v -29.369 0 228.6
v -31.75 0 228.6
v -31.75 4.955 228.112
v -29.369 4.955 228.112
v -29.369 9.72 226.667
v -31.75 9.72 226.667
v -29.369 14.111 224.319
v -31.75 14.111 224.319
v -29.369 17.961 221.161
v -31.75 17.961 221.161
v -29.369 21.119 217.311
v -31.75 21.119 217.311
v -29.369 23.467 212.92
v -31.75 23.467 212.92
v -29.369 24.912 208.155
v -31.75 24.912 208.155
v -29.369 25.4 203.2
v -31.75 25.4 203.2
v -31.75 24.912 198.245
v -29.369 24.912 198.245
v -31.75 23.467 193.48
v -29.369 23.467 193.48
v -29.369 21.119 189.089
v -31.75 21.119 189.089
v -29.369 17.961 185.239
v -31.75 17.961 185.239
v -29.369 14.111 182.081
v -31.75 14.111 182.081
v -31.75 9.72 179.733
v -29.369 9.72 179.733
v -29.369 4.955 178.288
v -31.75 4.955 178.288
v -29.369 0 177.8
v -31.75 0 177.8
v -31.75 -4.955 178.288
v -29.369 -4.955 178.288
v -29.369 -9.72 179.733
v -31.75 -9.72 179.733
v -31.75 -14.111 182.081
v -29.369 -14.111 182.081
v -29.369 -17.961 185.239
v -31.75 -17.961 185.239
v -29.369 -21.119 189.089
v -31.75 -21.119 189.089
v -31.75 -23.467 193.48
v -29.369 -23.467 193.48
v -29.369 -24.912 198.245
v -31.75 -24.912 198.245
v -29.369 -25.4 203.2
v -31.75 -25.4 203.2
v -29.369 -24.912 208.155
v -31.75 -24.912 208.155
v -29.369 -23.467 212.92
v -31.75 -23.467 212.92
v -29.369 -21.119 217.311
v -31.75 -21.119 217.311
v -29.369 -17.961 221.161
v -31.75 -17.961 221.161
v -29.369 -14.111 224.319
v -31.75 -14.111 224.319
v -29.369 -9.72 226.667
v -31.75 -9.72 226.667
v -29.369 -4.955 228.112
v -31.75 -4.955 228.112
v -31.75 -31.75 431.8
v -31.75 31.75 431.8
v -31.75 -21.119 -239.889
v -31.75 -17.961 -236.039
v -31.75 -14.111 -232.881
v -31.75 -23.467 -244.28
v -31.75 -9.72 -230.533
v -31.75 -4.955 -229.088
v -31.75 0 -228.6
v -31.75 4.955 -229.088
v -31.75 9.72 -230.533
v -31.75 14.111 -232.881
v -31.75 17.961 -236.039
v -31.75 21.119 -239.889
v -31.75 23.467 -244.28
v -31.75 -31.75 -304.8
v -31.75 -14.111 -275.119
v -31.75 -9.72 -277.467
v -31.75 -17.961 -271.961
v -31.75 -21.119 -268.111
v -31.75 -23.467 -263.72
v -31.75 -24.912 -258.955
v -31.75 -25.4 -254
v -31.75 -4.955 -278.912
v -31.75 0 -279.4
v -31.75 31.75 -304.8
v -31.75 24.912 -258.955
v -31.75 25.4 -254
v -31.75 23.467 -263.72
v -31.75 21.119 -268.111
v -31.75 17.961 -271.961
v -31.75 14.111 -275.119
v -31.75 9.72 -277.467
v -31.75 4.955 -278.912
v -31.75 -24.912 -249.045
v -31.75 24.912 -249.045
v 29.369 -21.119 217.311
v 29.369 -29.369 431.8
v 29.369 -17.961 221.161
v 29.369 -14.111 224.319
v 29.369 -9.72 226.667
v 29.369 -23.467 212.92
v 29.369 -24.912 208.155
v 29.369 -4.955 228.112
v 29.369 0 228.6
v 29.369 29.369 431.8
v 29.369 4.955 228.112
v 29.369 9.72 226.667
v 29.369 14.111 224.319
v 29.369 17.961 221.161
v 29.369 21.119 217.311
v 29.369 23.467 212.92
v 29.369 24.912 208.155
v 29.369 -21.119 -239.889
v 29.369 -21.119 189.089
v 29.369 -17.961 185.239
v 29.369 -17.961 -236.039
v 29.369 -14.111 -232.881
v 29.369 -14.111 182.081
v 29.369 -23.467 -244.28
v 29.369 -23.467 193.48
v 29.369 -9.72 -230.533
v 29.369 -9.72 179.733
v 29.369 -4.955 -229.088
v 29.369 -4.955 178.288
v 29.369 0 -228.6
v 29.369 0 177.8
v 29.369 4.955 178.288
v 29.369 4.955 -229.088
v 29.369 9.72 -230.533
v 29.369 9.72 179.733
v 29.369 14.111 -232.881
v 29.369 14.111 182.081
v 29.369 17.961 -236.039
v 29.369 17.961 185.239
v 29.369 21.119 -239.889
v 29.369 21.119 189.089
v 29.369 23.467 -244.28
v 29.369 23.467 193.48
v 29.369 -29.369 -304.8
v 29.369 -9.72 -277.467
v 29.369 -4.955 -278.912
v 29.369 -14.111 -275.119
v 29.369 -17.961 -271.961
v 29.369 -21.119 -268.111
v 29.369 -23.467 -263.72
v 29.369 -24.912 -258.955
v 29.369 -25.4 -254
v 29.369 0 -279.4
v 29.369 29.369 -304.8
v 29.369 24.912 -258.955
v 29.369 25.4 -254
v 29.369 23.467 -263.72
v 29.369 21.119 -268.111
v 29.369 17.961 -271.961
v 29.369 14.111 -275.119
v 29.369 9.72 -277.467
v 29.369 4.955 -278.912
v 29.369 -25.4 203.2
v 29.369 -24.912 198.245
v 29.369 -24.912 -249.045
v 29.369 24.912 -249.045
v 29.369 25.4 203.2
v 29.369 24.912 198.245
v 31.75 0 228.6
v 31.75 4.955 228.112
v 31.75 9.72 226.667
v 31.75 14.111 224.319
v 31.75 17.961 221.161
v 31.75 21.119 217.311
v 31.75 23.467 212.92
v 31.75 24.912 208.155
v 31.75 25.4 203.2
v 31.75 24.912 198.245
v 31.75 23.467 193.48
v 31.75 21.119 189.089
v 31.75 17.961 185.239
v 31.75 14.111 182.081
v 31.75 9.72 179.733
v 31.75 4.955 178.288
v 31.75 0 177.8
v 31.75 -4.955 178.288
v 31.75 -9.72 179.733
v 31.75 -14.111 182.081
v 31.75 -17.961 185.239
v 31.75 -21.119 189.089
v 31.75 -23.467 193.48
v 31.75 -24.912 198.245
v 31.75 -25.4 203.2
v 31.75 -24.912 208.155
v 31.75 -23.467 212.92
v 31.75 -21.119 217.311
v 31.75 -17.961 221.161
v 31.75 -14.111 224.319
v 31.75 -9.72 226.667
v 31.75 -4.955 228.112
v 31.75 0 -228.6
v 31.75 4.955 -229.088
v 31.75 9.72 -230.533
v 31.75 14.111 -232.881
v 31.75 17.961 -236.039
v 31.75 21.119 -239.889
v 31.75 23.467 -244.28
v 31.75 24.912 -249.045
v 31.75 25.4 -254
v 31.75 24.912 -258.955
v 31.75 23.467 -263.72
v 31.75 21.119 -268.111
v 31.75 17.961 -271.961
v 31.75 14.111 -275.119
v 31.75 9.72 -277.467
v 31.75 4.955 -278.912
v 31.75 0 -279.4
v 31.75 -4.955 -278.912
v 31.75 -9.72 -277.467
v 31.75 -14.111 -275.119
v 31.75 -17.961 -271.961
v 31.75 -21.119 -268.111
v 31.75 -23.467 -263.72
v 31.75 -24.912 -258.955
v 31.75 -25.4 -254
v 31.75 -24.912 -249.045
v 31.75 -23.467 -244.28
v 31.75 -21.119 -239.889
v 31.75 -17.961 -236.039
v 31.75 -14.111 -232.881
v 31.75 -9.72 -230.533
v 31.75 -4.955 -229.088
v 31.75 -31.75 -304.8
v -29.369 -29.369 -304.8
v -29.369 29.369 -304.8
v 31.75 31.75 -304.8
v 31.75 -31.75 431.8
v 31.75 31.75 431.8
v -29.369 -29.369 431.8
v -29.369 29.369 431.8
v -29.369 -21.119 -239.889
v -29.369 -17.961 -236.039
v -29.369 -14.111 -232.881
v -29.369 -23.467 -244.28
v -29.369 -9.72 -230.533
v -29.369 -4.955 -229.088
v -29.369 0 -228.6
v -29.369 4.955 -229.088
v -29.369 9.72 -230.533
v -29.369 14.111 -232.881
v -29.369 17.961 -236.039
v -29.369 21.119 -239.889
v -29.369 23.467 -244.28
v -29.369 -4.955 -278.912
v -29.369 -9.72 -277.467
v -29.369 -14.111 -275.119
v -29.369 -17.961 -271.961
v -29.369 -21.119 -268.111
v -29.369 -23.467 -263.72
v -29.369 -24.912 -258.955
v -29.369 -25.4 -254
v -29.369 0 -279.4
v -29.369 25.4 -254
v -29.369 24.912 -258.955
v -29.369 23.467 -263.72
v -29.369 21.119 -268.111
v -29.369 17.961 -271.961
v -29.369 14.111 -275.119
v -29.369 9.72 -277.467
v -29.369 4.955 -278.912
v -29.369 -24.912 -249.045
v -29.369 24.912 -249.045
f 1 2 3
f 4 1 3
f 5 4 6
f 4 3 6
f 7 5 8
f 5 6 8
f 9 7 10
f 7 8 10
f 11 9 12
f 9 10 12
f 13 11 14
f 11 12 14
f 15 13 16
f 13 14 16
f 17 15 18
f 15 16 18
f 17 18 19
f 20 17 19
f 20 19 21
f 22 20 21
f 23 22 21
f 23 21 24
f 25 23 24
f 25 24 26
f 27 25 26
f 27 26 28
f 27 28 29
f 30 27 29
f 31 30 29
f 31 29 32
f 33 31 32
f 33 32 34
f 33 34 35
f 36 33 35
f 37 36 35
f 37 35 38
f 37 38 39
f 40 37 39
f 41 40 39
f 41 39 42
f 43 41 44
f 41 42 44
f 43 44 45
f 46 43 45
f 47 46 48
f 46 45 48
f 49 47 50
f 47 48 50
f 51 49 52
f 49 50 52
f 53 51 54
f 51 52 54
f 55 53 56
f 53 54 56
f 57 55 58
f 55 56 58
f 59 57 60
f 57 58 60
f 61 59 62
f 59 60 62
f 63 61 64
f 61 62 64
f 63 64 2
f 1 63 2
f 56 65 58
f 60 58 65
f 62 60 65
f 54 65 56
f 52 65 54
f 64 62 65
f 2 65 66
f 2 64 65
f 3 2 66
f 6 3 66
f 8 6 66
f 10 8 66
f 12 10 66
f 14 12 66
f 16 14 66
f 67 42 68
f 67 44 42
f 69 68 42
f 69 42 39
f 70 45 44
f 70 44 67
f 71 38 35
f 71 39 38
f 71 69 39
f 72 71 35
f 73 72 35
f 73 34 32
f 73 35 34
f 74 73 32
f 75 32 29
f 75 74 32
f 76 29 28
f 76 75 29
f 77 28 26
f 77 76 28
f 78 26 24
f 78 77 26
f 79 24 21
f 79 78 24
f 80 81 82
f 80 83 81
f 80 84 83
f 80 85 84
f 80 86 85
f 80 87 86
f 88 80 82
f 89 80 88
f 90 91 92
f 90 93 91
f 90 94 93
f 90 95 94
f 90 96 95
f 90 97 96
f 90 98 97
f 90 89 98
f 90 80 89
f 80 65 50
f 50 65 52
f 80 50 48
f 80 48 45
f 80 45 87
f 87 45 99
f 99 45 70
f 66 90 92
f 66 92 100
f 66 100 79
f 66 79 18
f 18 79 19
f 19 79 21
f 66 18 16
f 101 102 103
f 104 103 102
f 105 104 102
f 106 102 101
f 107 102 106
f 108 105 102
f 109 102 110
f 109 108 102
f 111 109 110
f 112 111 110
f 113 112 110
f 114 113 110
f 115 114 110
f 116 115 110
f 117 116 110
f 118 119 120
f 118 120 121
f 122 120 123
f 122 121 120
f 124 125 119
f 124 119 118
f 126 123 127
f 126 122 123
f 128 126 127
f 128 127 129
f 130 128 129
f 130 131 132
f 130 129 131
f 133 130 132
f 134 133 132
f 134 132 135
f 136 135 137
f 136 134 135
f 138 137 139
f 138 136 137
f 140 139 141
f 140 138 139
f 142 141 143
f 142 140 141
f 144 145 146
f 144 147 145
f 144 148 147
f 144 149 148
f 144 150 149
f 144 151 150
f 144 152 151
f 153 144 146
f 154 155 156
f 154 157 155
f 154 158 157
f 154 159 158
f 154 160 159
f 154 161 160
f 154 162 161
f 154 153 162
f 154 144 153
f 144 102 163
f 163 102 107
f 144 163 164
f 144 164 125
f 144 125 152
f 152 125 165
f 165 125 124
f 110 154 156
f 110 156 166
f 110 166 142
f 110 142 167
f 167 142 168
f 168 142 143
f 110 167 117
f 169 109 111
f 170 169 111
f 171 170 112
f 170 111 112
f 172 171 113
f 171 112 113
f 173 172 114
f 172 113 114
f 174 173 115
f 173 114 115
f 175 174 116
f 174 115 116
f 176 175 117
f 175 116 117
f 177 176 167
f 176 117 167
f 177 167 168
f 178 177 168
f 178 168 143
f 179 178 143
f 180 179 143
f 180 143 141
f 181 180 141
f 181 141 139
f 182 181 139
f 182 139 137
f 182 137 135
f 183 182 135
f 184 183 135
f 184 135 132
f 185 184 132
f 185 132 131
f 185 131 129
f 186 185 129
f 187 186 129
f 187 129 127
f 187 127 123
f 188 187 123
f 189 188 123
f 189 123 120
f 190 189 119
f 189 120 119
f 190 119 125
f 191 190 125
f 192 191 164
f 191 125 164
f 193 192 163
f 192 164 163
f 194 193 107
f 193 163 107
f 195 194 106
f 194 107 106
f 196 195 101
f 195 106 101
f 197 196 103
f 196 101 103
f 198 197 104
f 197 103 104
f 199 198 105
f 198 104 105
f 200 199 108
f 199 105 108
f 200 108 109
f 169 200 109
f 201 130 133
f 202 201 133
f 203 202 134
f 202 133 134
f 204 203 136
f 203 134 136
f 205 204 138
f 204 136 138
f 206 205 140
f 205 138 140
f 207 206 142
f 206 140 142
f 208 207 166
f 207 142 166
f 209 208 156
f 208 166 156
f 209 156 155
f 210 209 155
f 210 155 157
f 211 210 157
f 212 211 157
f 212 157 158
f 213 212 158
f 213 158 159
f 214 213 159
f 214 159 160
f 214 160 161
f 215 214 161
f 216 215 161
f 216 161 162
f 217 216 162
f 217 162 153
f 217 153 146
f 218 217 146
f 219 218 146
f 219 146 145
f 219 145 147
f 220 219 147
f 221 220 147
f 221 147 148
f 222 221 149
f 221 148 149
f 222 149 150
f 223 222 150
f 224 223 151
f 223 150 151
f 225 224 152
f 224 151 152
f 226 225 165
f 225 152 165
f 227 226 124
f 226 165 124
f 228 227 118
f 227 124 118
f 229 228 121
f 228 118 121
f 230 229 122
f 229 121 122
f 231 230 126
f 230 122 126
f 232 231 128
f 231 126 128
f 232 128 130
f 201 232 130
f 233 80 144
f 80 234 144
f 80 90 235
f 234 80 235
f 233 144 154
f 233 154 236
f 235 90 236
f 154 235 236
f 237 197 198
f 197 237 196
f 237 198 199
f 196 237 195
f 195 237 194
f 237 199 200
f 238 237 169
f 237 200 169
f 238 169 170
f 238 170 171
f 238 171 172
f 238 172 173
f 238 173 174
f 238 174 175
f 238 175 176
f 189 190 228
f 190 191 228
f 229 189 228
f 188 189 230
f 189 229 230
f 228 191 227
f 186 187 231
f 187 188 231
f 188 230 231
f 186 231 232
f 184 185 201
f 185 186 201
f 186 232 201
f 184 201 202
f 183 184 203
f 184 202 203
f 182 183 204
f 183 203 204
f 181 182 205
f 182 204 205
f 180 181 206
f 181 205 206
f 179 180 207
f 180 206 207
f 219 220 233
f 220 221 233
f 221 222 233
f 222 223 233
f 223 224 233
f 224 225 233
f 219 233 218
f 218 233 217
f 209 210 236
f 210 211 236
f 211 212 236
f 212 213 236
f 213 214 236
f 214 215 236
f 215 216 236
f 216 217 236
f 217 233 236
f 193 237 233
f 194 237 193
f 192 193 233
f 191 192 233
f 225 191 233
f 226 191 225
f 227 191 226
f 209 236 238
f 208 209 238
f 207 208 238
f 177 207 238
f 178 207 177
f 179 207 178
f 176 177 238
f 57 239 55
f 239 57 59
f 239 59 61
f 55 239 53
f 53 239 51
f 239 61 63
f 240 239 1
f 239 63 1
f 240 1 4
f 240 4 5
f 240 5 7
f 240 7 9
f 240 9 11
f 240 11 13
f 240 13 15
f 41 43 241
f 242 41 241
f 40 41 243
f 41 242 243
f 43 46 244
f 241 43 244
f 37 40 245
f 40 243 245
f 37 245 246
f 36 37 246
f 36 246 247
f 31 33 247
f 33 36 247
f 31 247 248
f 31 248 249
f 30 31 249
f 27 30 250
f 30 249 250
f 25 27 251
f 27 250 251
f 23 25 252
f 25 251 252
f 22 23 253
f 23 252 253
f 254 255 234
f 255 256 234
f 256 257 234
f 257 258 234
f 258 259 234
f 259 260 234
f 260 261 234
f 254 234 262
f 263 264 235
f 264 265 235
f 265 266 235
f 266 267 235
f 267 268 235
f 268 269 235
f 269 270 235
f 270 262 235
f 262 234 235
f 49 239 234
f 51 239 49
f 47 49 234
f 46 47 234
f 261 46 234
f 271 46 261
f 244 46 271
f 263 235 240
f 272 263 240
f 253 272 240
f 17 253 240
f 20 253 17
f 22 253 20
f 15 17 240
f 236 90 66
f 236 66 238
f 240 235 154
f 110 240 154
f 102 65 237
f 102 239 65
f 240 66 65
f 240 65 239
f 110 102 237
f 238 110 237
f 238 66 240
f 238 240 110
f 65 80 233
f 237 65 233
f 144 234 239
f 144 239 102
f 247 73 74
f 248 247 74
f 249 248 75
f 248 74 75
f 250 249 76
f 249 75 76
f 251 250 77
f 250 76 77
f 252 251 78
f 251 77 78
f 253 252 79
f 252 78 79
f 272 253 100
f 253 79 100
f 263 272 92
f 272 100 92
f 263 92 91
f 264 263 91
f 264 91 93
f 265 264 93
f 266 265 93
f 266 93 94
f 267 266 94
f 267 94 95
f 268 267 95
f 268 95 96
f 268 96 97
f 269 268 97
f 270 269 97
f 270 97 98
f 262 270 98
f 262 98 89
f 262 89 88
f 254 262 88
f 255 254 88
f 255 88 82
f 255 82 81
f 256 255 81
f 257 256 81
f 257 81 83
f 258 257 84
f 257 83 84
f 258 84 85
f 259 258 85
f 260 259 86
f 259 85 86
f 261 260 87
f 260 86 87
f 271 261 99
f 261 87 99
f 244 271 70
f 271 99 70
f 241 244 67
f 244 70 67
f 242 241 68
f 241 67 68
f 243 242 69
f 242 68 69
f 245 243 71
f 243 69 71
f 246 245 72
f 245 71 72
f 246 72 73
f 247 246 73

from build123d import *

# Parameters (mm, degrees)
BOSS_EXTRUDE1_DEPTH      = 431.8
BOSS_EXTRUDE1_DEPTH_BACK = 304.8
SKETCH1_W                = 63.5
SKETCH1_H                = 63.5
SKETCH1_W_2              = 58.7375
SKETCH1_H_2              = 58.7375
SKETCH2_R                = 25.4
CUT_EXTRUDE1_DEPTH       = 438.597477712


with BuildPart() as part:
    # Sketch1 → Boss-Extrude1 (new, two sides: drawn at the far end of the back side and taken through both)
    with BuildSketch(Plane.XY.offset(-BOSS_EXTRUDE1_DEPTH_BACK)):
        Rectangle(SKETCH1_W, SKETCH1_H)
        Rectangle(SKETCH1_W_2, SKETCH1_H_2, mode=Mode.SUBTRACT)
    extrude(amount=BOSS_EXTRUDE1_DEPTH + BOSS_EXTRUDE1_DEPTH_BACK)

    # Sketch2 → Cut-Extrude1 (cut, through all)
    with BuildSketch(Plane.ZY.offset(31.75)):
        with Locations((-254, 0)):
            Circle(SKETCH2_R)
        with Locations((203.2, 0)):
            Circle(SKETCH2_R)
    extrude(amount=-CUT_EXTRUDE1_DEPTH, mode=Mode.SUBTRACT)


solid = part.part
